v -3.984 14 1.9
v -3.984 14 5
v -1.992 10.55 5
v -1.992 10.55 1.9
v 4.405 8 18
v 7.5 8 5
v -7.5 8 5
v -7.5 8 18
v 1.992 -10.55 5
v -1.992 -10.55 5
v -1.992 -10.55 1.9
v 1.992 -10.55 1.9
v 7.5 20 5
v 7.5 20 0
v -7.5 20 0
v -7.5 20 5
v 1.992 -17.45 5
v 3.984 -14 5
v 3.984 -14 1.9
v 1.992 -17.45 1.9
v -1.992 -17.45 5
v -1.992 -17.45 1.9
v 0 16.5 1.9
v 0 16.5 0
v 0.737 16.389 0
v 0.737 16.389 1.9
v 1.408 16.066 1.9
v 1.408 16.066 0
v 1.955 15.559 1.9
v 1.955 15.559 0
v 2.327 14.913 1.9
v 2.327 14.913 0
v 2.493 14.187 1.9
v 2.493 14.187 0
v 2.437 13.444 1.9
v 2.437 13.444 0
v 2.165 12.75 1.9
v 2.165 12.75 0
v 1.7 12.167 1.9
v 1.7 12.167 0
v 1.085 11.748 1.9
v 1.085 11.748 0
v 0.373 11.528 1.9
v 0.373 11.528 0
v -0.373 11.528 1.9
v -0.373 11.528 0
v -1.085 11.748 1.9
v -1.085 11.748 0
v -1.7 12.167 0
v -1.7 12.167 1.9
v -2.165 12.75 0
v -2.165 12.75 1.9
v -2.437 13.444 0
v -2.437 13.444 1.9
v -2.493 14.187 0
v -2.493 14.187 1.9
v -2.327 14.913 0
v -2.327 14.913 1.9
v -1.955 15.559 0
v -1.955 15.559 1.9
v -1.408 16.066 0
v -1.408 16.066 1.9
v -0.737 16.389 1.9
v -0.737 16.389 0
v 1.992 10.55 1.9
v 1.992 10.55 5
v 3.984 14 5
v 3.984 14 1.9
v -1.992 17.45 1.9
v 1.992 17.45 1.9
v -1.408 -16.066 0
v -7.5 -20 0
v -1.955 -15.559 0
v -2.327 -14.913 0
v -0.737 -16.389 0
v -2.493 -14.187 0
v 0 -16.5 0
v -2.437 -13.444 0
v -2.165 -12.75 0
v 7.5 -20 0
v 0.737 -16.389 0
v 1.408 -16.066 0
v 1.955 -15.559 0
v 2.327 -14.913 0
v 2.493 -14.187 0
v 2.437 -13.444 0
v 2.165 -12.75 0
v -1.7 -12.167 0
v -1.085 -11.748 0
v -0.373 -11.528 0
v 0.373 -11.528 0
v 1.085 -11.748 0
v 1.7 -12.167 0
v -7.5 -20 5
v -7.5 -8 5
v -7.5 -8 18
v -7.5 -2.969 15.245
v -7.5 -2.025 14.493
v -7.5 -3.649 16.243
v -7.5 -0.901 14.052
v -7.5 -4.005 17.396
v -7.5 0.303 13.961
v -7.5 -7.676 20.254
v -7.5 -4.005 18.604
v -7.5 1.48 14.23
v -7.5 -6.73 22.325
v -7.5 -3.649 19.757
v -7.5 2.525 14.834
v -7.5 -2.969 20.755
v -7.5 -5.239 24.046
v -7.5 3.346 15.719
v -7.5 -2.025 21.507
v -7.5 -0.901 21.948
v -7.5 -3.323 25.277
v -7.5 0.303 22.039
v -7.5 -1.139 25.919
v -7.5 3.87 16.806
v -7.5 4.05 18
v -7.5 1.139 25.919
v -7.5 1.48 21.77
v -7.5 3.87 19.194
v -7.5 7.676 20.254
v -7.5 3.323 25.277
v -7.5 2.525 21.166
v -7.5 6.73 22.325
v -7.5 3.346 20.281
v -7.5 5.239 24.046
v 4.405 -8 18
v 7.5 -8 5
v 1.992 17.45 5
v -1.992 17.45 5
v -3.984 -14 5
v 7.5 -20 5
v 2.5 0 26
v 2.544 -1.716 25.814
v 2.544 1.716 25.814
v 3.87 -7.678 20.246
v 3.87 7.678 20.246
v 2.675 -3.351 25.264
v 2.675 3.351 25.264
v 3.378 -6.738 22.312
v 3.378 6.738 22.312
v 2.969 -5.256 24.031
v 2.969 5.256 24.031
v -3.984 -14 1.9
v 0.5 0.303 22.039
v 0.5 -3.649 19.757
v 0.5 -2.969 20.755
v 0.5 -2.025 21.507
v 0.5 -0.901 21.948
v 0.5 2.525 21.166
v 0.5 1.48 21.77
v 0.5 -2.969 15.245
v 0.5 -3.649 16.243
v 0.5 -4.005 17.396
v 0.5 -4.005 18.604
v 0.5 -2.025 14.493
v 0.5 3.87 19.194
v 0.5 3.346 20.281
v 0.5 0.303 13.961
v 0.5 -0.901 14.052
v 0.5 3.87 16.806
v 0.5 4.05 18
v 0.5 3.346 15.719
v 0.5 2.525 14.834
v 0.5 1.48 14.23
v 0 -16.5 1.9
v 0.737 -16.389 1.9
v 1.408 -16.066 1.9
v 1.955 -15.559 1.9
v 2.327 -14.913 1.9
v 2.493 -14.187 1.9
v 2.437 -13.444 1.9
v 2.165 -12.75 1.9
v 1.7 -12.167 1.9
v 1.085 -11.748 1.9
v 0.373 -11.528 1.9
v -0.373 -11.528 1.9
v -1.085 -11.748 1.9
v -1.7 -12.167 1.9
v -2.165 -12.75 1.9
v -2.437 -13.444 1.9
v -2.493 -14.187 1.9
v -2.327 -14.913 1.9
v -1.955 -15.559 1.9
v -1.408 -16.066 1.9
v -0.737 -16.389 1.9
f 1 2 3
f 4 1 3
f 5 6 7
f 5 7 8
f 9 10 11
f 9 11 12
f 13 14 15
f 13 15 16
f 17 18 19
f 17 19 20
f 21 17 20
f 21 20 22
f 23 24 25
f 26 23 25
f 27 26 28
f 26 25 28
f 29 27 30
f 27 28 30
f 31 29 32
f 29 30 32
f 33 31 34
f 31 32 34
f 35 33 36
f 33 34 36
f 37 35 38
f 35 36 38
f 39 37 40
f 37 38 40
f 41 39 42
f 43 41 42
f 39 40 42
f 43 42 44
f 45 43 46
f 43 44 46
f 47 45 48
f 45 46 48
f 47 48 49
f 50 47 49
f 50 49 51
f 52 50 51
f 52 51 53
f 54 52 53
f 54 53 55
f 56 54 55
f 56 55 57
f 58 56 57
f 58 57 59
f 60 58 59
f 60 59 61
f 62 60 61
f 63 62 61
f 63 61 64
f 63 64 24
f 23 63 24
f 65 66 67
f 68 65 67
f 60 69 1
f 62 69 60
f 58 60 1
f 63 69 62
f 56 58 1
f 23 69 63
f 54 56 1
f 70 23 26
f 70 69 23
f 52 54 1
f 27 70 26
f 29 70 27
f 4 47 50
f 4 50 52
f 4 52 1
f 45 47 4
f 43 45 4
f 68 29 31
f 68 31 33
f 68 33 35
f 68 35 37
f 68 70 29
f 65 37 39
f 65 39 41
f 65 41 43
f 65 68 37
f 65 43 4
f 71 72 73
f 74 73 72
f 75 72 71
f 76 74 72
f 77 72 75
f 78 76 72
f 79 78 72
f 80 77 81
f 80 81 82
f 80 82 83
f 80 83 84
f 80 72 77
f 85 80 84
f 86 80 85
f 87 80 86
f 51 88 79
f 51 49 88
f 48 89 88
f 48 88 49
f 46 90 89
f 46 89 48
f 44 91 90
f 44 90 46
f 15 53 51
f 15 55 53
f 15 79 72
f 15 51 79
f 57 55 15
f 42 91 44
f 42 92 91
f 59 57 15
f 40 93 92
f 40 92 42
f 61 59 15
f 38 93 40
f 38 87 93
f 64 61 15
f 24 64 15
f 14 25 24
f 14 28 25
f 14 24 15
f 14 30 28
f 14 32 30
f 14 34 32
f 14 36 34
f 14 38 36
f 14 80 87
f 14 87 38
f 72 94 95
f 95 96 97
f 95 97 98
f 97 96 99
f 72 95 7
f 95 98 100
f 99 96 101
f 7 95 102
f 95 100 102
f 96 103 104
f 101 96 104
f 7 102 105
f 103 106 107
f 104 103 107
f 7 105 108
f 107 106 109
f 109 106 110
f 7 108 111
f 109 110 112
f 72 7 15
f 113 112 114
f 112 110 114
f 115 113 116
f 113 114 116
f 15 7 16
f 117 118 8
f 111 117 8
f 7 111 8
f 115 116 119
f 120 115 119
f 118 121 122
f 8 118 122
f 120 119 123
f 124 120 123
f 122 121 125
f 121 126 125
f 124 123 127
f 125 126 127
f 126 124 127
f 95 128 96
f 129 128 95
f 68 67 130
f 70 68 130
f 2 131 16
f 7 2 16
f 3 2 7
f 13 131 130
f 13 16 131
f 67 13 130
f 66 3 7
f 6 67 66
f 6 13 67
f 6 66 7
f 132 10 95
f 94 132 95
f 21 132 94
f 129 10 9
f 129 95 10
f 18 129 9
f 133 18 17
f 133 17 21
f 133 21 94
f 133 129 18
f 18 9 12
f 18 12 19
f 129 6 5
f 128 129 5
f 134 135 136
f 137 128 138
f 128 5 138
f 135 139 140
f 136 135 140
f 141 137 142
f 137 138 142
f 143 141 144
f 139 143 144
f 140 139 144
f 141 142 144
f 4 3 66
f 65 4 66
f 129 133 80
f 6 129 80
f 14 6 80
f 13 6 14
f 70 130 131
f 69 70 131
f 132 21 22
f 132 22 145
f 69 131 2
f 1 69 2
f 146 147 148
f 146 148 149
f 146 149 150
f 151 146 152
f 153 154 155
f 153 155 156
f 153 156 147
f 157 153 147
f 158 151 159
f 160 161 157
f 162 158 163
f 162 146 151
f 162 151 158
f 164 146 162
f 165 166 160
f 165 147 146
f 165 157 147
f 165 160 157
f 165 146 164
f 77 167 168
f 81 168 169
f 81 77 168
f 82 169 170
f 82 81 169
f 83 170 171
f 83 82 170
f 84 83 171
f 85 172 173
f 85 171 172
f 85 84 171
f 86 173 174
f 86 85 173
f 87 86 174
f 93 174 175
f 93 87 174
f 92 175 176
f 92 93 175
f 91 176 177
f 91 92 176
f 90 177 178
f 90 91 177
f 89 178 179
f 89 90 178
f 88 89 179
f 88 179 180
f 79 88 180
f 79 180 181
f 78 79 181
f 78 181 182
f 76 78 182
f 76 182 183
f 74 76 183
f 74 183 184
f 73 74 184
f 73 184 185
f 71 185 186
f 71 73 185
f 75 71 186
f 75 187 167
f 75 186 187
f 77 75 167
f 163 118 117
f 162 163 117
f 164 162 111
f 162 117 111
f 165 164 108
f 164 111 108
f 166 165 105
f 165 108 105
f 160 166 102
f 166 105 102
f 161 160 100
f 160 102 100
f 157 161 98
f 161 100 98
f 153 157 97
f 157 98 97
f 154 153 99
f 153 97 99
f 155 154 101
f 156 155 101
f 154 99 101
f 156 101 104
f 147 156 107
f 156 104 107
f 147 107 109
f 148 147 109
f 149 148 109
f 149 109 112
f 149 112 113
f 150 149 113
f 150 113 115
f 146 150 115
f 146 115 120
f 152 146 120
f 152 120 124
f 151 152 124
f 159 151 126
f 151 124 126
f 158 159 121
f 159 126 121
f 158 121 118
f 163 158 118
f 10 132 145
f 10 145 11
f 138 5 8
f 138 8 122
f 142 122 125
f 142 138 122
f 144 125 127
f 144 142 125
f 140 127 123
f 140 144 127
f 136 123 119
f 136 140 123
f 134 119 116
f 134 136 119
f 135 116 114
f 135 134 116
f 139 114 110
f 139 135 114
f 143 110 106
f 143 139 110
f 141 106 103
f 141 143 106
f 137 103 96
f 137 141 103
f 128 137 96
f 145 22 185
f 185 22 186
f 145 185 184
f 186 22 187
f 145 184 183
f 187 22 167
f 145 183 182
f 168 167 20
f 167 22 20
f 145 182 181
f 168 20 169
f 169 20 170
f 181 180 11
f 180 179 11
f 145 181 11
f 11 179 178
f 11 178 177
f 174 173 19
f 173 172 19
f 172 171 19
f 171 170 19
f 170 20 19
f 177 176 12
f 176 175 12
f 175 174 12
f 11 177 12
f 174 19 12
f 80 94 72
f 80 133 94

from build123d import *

# Parameters (mm, degrees)
PAD_DEPTH            = 7.5
POCKET_DEPTH         = 3.1
SKETCH002_R          = 2.5
POCKET001_DEPTH      = 126.020998
SKETCH003_R          = 4.05
POCKET002_DEPTH      = 8
POCKET003_DEPTH      = 20.001
POCKET003_DEPTH_BACK = -20.001


with BuildPart() as part:
    # Sketch → Pad (new body, symmetric)
    with BuildSketch(Plane.YZ):
        with BuildLine():
            Line((-20, 0), (20, 0))
            Line((20, 0), (20, 5))
            Line((20, 5), (8, 5))
            Line((8, 5), (8, 18))
            ThreePointArc((8, 18), (0, 26), (-8, 18))
            Line((-8, 18), (-8, 5))
            Line((-8, 5), (-20, 5))
            Line((-20, 5), (-20, 0))
        make_face()
    extrude(amount=PAD_DEPTH, both=True)

    # Sketch001 (on Face7 of Pad) → Pocket (cut)
    with BuildSketch(Plane(origin=(0, 0, 5), x_dir=(0, -1, 0), z_dir=(0, 0, 1))):
        Polygon((-10.55, 1.991858), (-14, 3.983717), (-17.45, 1.991858), (-17.45, -1.991858), (-14, -3.983717), (-10.55, -1.991858), align=None)
    pocket = extrude(amount=-POCKET_DEPTH, mode=Mode.SUBTRACT)

    # Sketch002 (on Face1 of Pocket) → Pocket001 (cut, through all)
    with BuildSketch(Plane.YX):
        with Locations((14, 0)):
            Circle(SKETCH002_R)
    pocket001 = extrude(amount=-POCKET001_DEPTH, mode=Mode.SUBTRACT)

    # Mirrored: Pocket, Pocket001 across XZ
    add(pocket.mirror(Plane.XZ), mode=Mode.SUBTRACT)
    add(pocket001.mirror(Plane.XZ), mode=Mode.SUBTRACT)

    # Sketch003 (on Face3 of Mirrored) → Pocket002 (cut)
    with BuildSketch(Plane(origin=(-7.5, 0, 0), x_dir=(0, 1, 0), z_dir=(-1, 0, 0))):
        with Locations((0, -18)):
            Circle(SKETCH003_R)
    extrude(amount=-POCKET002_DEPTH, mode=Mode.SUBTRACT)

    # Sketch004 → Pocket003 (cut, two sides)
    with BuildSketch(Plane.XZ) as pocket003_sk:
        Polygon((7.5, 5), (2.5, 26), (7.5, 26), align=None)
    extrude(amount=-POCKET003_DEPTH, mode=Mode.SUBTRACT)
    extrude(pocket003_sk.sketch, amount=-POCKET003_DEPTH_BACK, mode=Mode.SUBTRACT)


solid = part.part
